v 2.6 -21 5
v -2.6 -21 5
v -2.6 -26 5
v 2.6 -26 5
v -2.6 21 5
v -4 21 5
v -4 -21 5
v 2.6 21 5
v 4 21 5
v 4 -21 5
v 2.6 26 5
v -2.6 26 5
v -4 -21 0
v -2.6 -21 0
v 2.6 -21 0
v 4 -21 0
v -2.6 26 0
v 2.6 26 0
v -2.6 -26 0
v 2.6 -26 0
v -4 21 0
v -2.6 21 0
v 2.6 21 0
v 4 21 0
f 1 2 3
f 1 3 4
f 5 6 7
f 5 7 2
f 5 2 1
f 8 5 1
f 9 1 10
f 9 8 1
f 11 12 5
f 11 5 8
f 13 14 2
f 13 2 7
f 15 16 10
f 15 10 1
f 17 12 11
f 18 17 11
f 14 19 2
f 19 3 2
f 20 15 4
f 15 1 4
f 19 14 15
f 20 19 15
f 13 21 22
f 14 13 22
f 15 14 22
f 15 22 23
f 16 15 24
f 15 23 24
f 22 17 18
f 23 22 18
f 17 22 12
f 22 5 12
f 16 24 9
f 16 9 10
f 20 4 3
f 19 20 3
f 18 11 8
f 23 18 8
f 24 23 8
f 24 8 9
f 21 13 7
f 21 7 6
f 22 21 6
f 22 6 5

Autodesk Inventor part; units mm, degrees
ref_plane "YZ Plane" through (0, 0, 0) normal (1, 0, 0) x (0, 1, 0)
ref_plane "XZ Plane" through (0, 0, 0) normal (0, 1, 0) x (-1, 0, 0)
ref_plane "XY Plane" through (0, 0, 0) normal (0, 0, 1) x (1, 0, 0)
sketch "Sketch1" plane through (0, 0, 0) normal (0, 0, 1) x (1, 0, 0)
  line L0 (-4, 21) -> (4, 21)
  line L1 (4, 21) -> (4, -21)
  line L2 (4, -21) -> (-4, -21)
  line L3 (-4, -21) -> (-4, 21)
  line L4 (-4, 21) -> (4, -21) construction
  line L5 (4, 21) -> (-4, -21) construction
  point P0 (0, 0)
  dimension "d0" = 8
  dimension "d1" = 42
extrude "Extrusion1" add sketch "Sketch1" along normal blind 5
sketch "Sketch2" plane through (0, 0, 5) normal (0, 0, 1) x (1, 0, 0)
  line L0 (4, 21) -> (-4, 21) projected
  line L1 (-2.6, 26) -> (2.6, 26)
  line L2 (2.6, 26) -> (2.6, 21)
  line L3 (2.6, 21) -> (-2.6, 21)
  line L4 (-2.6, 21) -> (-2.6, 26)
  line L5 (-2.6, 26) -> (2.6, 21) construction
  line L6 (2.6, 26) -> (-2.6, 21) construction
  point P0 (0, 0)
  point P1 (0, 23.5)
  point P2 (0, 21)
  dimension "d4" = 5.2
  dimension "d5" = 5
extrude "Extrusion2" add sketch "Sketch2" against normal blind 5
mirror "Mirror1" about plane through (0, 0, 0) normal (0, 1, 0) of "Extrusion2"
equation "\"kerf\" = 0.15"
properties part number "Stopper"
